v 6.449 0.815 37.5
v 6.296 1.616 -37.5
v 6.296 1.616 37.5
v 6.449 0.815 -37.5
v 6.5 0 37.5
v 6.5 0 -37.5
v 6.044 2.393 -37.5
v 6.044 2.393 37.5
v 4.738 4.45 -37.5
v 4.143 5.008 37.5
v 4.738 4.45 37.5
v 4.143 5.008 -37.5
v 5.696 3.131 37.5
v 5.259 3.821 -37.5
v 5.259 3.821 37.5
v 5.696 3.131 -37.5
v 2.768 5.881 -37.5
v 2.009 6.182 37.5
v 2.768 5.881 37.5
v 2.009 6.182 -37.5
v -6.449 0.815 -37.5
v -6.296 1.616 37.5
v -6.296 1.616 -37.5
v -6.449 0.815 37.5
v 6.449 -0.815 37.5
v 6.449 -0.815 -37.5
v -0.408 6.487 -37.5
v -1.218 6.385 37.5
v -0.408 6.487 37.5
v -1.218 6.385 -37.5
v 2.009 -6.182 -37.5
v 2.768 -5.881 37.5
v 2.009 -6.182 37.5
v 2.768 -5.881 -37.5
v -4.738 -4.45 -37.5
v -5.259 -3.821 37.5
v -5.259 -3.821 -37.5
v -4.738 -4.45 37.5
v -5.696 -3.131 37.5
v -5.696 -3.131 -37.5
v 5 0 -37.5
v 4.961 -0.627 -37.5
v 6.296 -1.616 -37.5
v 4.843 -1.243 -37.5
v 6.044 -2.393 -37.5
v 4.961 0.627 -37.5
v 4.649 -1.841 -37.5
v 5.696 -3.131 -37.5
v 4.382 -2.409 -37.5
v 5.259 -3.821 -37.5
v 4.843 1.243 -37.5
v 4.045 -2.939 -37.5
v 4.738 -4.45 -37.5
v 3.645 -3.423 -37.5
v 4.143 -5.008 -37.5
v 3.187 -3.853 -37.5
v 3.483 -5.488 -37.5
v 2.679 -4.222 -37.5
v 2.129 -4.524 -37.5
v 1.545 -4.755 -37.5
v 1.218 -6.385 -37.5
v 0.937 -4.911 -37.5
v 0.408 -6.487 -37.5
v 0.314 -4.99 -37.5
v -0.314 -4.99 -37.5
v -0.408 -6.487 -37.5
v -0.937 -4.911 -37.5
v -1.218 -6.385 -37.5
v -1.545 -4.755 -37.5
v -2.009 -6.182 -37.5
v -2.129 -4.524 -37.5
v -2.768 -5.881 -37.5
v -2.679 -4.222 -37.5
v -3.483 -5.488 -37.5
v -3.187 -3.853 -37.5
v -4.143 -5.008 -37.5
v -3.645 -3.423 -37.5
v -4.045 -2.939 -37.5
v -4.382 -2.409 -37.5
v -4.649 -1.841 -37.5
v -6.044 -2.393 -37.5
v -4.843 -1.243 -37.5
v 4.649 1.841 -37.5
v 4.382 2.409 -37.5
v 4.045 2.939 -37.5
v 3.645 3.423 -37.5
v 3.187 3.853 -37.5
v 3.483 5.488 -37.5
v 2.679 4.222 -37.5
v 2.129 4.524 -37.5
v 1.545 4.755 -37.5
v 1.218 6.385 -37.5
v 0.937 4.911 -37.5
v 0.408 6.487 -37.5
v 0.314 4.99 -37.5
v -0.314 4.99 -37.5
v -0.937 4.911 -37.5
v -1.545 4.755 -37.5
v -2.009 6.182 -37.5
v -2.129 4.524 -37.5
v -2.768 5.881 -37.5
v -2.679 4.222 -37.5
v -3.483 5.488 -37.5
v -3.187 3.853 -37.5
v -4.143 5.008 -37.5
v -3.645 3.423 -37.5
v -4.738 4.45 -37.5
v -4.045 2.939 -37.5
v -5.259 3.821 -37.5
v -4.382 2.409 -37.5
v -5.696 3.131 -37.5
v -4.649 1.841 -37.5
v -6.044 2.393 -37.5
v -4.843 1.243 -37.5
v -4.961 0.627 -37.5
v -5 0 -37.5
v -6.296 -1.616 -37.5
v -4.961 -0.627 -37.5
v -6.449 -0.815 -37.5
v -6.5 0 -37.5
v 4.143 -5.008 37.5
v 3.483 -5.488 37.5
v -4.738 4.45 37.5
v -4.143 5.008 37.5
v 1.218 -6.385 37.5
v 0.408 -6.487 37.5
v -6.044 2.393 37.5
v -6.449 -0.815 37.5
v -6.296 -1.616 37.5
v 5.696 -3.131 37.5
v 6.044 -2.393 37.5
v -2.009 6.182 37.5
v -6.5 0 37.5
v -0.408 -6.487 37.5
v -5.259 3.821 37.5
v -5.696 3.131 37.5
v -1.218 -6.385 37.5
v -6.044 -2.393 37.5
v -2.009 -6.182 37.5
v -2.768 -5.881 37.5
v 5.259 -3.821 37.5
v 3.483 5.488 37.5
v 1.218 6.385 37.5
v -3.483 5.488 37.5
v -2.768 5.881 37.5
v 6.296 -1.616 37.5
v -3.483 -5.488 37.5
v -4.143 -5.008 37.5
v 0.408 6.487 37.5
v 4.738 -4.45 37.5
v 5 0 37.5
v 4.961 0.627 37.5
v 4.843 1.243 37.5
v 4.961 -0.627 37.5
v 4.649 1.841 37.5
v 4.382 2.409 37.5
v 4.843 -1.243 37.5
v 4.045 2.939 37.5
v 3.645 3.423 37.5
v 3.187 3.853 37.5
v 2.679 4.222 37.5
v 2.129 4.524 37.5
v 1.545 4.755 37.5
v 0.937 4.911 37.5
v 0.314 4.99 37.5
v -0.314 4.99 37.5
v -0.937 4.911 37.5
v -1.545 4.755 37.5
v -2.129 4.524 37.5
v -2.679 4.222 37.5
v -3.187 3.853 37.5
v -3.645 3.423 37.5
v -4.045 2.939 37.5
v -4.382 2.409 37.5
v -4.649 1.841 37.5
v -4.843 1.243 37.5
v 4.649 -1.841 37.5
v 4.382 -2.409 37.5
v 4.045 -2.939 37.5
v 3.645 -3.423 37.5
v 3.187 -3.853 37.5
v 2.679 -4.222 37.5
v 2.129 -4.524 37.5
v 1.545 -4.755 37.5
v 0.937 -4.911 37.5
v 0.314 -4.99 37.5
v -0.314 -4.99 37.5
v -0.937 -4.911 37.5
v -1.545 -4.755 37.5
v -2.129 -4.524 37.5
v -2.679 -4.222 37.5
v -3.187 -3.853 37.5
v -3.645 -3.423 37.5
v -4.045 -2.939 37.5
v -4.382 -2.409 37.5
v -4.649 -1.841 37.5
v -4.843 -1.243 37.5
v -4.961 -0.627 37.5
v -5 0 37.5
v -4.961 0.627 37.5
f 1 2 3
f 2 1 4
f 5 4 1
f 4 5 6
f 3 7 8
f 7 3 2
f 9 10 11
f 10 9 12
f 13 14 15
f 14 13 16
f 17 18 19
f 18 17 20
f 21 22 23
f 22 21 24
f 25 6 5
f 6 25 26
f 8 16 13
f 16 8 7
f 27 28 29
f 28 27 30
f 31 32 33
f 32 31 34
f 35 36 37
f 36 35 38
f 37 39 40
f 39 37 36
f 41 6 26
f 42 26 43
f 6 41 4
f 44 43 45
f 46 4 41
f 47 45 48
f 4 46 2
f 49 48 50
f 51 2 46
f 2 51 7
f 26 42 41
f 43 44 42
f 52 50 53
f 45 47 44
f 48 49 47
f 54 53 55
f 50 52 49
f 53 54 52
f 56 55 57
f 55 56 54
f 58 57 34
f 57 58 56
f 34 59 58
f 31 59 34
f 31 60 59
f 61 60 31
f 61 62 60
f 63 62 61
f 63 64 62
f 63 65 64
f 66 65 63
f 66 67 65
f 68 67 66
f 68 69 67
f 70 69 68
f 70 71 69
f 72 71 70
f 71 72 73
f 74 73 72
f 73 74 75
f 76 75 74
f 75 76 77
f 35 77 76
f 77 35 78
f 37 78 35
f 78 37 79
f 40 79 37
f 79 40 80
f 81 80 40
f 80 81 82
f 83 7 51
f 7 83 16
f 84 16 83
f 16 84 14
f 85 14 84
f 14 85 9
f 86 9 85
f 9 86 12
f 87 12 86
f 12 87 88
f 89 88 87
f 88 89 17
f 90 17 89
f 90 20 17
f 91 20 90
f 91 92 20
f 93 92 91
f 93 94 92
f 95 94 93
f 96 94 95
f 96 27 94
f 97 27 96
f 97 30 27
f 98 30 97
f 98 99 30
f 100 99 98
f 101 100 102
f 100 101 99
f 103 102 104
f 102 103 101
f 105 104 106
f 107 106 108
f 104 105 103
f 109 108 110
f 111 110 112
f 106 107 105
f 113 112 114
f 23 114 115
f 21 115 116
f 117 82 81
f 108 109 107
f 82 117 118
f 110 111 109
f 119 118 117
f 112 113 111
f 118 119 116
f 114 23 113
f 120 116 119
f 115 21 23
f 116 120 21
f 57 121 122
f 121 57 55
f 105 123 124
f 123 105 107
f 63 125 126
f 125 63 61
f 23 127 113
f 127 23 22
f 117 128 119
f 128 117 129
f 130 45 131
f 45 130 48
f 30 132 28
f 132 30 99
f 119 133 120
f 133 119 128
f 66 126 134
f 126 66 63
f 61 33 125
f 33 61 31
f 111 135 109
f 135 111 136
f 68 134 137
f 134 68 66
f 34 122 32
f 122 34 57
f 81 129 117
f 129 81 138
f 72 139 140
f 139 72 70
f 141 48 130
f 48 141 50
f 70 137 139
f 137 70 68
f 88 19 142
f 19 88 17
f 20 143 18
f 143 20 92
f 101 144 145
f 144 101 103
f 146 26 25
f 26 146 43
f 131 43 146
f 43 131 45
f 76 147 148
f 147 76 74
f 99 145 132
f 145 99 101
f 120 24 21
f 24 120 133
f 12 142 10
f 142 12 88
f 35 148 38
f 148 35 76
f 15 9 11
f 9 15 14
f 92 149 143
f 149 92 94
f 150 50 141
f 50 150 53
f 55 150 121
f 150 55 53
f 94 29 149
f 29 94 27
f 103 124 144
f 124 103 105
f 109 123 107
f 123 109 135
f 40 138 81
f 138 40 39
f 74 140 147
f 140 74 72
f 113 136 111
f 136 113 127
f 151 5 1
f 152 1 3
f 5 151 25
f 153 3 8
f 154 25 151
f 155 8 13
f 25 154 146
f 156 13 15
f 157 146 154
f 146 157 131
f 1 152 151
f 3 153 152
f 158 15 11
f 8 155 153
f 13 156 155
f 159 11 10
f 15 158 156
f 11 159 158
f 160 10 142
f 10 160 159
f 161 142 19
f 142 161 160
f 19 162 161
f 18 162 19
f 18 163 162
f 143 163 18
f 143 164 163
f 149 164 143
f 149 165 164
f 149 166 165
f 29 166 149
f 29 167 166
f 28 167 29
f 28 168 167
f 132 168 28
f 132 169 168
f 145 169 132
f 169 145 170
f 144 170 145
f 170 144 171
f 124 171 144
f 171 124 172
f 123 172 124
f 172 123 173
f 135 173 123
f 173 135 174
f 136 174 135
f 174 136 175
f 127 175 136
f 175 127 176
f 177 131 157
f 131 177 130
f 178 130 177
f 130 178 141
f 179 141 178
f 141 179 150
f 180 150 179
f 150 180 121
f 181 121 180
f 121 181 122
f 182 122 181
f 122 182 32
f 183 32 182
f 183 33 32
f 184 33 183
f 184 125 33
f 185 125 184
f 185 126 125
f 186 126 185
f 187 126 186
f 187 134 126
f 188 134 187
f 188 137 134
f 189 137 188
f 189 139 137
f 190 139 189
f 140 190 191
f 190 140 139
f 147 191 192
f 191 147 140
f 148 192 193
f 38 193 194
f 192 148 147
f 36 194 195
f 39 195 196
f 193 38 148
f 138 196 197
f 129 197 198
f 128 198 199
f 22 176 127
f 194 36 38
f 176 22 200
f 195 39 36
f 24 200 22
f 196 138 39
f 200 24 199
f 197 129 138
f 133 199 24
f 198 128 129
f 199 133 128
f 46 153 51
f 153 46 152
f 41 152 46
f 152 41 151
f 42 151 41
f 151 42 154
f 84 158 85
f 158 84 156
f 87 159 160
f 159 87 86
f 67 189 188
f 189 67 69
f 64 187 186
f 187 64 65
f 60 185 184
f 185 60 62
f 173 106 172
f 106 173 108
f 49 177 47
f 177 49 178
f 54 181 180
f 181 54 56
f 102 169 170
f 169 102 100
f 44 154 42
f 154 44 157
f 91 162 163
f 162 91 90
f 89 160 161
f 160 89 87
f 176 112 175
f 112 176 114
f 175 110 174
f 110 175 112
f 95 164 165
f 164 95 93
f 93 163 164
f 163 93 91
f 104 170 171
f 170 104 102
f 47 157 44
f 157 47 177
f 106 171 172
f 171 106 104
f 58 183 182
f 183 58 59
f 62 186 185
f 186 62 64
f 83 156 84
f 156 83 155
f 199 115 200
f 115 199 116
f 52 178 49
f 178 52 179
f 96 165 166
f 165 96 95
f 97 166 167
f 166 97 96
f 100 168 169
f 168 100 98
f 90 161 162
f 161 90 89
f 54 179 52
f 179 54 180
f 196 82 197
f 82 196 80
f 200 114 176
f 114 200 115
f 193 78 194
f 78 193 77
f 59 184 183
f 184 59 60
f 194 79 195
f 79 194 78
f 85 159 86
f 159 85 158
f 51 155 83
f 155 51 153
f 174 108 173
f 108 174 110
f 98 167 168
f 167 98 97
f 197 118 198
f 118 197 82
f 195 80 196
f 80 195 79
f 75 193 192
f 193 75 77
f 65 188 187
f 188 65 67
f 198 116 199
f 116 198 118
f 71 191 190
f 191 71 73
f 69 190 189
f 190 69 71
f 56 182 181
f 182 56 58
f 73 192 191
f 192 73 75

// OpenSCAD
$fn = 50;


difference() {
	union() {
		translate(v = [0, 0, -37.5000000000]) {
			cylinder(h = 75, r = 6.5000000000);
		}
	}
	union() {
		translate(v = [0, 0, -100.0000000000]) {
			cylinder(h = 200, r = 5.0000000000);
		}
	}
}
